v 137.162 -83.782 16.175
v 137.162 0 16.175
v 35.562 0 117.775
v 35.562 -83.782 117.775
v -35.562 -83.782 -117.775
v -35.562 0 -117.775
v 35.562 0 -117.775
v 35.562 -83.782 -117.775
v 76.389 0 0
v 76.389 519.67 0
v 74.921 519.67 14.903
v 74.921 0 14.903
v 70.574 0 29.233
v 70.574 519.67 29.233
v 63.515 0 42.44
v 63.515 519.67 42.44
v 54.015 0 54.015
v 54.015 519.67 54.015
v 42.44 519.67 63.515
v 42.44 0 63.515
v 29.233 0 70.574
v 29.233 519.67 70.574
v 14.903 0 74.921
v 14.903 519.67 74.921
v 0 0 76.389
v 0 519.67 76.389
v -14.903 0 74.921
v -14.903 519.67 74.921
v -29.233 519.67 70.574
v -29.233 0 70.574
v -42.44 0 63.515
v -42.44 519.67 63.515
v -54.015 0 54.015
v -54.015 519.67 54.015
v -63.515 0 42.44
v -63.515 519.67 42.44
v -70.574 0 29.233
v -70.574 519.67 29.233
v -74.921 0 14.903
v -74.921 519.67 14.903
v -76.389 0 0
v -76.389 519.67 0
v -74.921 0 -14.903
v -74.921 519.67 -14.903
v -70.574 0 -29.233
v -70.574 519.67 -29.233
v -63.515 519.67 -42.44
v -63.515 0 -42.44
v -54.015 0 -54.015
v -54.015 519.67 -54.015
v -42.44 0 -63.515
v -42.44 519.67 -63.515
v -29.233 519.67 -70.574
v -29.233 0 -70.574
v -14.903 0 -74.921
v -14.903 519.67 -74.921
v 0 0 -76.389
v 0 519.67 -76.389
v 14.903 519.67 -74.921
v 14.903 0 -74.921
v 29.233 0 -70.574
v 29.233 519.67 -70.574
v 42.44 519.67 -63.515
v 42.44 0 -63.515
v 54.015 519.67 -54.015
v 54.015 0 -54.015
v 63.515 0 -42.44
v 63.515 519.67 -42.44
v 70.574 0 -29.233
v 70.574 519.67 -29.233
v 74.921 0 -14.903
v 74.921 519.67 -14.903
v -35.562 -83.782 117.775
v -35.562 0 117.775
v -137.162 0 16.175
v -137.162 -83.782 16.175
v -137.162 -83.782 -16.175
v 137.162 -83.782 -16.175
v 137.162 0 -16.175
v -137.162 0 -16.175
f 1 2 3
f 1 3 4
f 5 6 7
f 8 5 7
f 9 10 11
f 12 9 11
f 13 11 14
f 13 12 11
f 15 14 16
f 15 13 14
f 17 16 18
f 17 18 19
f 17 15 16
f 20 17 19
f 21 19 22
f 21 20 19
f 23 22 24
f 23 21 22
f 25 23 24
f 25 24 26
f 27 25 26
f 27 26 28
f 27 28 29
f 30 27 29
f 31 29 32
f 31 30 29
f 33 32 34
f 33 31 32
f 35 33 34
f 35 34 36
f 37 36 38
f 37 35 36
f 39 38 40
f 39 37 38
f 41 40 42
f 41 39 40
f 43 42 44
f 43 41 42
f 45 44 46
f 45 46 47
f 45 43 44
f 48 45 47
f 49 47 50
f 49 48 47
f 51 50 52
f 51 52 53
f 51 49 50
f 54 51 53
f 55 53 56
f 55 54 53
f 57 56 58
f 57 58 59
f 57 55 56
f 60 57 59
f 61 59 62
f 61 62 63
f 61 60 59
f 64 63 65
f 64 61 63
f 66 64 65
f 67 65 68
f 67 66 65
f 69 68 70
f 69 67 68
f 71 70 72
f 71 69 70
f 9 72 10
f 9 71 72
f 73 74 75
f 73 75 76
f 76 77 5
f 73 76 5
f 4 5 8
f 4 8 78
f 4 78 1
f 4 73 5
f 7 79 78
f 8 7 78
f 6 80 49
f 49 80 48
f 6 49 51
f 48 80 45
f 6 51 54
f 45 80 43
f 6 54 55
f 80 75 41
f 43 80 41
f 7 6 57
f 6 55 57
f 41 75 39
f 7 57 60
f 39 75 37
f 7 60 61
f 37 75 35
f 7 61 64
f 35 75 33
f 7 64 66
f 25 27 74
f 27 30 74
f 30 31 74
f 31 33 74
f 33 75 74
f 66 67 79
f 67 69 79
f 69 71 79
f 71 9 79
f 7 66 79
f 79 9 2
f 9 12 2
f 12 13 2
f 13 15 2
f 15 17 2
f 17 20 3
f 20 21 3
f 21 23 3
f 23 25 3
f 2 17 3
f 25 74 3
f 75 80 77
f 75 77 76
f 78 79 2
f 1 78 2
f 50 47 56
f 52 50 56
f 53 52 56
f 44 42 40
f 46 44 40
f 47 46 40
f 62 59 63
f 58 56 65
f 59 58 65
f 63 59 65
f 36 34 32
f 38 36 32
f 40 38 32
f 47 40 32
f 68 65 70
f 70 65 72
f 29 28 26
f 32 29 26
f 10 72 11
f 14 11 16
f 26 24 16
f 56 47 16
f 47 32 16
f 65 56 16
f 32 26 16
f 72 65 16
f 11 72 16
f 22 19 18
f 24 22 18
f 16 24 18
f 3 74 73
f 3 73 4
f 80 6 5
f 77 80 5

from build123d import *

# Parameters (mm, degrees)
F0_R     = 76.389164
F1_DEPTH = 519.66989
F2_W     = 274.323284
F2_H     = 235.549598
F3_DEPTH = 83.782351
F4_SIZE  = 101.6


with BuildPart() as f1:
    # F0 (on Front) → F1 (new body)
    with BuildSketch(Plane.XZ):
        Circle(F0_R)
    extrude(amount=-F1_DEPTH)

    # F2 (on Front) → F3 (join)
    with BuildSketch(Plane.XZ):
        Rectangle(F2_W, F2_H)
    extrude(amount=F3_DEPTH)

    # F4
    f4_edges = [f1.edges().sort_by_distance(p)[0] for p in [
        (137.161642, -41.891175, 117.774799),
        (-137.161642, -41.891175, 117.774799),
        (-137.161642, -41.891175, -117.774799),
        (137.161642, -41.891175, -117.774799),
    ]]
    chamfer(f4_edges, length=F4_SIZE)


solid = f1.part
